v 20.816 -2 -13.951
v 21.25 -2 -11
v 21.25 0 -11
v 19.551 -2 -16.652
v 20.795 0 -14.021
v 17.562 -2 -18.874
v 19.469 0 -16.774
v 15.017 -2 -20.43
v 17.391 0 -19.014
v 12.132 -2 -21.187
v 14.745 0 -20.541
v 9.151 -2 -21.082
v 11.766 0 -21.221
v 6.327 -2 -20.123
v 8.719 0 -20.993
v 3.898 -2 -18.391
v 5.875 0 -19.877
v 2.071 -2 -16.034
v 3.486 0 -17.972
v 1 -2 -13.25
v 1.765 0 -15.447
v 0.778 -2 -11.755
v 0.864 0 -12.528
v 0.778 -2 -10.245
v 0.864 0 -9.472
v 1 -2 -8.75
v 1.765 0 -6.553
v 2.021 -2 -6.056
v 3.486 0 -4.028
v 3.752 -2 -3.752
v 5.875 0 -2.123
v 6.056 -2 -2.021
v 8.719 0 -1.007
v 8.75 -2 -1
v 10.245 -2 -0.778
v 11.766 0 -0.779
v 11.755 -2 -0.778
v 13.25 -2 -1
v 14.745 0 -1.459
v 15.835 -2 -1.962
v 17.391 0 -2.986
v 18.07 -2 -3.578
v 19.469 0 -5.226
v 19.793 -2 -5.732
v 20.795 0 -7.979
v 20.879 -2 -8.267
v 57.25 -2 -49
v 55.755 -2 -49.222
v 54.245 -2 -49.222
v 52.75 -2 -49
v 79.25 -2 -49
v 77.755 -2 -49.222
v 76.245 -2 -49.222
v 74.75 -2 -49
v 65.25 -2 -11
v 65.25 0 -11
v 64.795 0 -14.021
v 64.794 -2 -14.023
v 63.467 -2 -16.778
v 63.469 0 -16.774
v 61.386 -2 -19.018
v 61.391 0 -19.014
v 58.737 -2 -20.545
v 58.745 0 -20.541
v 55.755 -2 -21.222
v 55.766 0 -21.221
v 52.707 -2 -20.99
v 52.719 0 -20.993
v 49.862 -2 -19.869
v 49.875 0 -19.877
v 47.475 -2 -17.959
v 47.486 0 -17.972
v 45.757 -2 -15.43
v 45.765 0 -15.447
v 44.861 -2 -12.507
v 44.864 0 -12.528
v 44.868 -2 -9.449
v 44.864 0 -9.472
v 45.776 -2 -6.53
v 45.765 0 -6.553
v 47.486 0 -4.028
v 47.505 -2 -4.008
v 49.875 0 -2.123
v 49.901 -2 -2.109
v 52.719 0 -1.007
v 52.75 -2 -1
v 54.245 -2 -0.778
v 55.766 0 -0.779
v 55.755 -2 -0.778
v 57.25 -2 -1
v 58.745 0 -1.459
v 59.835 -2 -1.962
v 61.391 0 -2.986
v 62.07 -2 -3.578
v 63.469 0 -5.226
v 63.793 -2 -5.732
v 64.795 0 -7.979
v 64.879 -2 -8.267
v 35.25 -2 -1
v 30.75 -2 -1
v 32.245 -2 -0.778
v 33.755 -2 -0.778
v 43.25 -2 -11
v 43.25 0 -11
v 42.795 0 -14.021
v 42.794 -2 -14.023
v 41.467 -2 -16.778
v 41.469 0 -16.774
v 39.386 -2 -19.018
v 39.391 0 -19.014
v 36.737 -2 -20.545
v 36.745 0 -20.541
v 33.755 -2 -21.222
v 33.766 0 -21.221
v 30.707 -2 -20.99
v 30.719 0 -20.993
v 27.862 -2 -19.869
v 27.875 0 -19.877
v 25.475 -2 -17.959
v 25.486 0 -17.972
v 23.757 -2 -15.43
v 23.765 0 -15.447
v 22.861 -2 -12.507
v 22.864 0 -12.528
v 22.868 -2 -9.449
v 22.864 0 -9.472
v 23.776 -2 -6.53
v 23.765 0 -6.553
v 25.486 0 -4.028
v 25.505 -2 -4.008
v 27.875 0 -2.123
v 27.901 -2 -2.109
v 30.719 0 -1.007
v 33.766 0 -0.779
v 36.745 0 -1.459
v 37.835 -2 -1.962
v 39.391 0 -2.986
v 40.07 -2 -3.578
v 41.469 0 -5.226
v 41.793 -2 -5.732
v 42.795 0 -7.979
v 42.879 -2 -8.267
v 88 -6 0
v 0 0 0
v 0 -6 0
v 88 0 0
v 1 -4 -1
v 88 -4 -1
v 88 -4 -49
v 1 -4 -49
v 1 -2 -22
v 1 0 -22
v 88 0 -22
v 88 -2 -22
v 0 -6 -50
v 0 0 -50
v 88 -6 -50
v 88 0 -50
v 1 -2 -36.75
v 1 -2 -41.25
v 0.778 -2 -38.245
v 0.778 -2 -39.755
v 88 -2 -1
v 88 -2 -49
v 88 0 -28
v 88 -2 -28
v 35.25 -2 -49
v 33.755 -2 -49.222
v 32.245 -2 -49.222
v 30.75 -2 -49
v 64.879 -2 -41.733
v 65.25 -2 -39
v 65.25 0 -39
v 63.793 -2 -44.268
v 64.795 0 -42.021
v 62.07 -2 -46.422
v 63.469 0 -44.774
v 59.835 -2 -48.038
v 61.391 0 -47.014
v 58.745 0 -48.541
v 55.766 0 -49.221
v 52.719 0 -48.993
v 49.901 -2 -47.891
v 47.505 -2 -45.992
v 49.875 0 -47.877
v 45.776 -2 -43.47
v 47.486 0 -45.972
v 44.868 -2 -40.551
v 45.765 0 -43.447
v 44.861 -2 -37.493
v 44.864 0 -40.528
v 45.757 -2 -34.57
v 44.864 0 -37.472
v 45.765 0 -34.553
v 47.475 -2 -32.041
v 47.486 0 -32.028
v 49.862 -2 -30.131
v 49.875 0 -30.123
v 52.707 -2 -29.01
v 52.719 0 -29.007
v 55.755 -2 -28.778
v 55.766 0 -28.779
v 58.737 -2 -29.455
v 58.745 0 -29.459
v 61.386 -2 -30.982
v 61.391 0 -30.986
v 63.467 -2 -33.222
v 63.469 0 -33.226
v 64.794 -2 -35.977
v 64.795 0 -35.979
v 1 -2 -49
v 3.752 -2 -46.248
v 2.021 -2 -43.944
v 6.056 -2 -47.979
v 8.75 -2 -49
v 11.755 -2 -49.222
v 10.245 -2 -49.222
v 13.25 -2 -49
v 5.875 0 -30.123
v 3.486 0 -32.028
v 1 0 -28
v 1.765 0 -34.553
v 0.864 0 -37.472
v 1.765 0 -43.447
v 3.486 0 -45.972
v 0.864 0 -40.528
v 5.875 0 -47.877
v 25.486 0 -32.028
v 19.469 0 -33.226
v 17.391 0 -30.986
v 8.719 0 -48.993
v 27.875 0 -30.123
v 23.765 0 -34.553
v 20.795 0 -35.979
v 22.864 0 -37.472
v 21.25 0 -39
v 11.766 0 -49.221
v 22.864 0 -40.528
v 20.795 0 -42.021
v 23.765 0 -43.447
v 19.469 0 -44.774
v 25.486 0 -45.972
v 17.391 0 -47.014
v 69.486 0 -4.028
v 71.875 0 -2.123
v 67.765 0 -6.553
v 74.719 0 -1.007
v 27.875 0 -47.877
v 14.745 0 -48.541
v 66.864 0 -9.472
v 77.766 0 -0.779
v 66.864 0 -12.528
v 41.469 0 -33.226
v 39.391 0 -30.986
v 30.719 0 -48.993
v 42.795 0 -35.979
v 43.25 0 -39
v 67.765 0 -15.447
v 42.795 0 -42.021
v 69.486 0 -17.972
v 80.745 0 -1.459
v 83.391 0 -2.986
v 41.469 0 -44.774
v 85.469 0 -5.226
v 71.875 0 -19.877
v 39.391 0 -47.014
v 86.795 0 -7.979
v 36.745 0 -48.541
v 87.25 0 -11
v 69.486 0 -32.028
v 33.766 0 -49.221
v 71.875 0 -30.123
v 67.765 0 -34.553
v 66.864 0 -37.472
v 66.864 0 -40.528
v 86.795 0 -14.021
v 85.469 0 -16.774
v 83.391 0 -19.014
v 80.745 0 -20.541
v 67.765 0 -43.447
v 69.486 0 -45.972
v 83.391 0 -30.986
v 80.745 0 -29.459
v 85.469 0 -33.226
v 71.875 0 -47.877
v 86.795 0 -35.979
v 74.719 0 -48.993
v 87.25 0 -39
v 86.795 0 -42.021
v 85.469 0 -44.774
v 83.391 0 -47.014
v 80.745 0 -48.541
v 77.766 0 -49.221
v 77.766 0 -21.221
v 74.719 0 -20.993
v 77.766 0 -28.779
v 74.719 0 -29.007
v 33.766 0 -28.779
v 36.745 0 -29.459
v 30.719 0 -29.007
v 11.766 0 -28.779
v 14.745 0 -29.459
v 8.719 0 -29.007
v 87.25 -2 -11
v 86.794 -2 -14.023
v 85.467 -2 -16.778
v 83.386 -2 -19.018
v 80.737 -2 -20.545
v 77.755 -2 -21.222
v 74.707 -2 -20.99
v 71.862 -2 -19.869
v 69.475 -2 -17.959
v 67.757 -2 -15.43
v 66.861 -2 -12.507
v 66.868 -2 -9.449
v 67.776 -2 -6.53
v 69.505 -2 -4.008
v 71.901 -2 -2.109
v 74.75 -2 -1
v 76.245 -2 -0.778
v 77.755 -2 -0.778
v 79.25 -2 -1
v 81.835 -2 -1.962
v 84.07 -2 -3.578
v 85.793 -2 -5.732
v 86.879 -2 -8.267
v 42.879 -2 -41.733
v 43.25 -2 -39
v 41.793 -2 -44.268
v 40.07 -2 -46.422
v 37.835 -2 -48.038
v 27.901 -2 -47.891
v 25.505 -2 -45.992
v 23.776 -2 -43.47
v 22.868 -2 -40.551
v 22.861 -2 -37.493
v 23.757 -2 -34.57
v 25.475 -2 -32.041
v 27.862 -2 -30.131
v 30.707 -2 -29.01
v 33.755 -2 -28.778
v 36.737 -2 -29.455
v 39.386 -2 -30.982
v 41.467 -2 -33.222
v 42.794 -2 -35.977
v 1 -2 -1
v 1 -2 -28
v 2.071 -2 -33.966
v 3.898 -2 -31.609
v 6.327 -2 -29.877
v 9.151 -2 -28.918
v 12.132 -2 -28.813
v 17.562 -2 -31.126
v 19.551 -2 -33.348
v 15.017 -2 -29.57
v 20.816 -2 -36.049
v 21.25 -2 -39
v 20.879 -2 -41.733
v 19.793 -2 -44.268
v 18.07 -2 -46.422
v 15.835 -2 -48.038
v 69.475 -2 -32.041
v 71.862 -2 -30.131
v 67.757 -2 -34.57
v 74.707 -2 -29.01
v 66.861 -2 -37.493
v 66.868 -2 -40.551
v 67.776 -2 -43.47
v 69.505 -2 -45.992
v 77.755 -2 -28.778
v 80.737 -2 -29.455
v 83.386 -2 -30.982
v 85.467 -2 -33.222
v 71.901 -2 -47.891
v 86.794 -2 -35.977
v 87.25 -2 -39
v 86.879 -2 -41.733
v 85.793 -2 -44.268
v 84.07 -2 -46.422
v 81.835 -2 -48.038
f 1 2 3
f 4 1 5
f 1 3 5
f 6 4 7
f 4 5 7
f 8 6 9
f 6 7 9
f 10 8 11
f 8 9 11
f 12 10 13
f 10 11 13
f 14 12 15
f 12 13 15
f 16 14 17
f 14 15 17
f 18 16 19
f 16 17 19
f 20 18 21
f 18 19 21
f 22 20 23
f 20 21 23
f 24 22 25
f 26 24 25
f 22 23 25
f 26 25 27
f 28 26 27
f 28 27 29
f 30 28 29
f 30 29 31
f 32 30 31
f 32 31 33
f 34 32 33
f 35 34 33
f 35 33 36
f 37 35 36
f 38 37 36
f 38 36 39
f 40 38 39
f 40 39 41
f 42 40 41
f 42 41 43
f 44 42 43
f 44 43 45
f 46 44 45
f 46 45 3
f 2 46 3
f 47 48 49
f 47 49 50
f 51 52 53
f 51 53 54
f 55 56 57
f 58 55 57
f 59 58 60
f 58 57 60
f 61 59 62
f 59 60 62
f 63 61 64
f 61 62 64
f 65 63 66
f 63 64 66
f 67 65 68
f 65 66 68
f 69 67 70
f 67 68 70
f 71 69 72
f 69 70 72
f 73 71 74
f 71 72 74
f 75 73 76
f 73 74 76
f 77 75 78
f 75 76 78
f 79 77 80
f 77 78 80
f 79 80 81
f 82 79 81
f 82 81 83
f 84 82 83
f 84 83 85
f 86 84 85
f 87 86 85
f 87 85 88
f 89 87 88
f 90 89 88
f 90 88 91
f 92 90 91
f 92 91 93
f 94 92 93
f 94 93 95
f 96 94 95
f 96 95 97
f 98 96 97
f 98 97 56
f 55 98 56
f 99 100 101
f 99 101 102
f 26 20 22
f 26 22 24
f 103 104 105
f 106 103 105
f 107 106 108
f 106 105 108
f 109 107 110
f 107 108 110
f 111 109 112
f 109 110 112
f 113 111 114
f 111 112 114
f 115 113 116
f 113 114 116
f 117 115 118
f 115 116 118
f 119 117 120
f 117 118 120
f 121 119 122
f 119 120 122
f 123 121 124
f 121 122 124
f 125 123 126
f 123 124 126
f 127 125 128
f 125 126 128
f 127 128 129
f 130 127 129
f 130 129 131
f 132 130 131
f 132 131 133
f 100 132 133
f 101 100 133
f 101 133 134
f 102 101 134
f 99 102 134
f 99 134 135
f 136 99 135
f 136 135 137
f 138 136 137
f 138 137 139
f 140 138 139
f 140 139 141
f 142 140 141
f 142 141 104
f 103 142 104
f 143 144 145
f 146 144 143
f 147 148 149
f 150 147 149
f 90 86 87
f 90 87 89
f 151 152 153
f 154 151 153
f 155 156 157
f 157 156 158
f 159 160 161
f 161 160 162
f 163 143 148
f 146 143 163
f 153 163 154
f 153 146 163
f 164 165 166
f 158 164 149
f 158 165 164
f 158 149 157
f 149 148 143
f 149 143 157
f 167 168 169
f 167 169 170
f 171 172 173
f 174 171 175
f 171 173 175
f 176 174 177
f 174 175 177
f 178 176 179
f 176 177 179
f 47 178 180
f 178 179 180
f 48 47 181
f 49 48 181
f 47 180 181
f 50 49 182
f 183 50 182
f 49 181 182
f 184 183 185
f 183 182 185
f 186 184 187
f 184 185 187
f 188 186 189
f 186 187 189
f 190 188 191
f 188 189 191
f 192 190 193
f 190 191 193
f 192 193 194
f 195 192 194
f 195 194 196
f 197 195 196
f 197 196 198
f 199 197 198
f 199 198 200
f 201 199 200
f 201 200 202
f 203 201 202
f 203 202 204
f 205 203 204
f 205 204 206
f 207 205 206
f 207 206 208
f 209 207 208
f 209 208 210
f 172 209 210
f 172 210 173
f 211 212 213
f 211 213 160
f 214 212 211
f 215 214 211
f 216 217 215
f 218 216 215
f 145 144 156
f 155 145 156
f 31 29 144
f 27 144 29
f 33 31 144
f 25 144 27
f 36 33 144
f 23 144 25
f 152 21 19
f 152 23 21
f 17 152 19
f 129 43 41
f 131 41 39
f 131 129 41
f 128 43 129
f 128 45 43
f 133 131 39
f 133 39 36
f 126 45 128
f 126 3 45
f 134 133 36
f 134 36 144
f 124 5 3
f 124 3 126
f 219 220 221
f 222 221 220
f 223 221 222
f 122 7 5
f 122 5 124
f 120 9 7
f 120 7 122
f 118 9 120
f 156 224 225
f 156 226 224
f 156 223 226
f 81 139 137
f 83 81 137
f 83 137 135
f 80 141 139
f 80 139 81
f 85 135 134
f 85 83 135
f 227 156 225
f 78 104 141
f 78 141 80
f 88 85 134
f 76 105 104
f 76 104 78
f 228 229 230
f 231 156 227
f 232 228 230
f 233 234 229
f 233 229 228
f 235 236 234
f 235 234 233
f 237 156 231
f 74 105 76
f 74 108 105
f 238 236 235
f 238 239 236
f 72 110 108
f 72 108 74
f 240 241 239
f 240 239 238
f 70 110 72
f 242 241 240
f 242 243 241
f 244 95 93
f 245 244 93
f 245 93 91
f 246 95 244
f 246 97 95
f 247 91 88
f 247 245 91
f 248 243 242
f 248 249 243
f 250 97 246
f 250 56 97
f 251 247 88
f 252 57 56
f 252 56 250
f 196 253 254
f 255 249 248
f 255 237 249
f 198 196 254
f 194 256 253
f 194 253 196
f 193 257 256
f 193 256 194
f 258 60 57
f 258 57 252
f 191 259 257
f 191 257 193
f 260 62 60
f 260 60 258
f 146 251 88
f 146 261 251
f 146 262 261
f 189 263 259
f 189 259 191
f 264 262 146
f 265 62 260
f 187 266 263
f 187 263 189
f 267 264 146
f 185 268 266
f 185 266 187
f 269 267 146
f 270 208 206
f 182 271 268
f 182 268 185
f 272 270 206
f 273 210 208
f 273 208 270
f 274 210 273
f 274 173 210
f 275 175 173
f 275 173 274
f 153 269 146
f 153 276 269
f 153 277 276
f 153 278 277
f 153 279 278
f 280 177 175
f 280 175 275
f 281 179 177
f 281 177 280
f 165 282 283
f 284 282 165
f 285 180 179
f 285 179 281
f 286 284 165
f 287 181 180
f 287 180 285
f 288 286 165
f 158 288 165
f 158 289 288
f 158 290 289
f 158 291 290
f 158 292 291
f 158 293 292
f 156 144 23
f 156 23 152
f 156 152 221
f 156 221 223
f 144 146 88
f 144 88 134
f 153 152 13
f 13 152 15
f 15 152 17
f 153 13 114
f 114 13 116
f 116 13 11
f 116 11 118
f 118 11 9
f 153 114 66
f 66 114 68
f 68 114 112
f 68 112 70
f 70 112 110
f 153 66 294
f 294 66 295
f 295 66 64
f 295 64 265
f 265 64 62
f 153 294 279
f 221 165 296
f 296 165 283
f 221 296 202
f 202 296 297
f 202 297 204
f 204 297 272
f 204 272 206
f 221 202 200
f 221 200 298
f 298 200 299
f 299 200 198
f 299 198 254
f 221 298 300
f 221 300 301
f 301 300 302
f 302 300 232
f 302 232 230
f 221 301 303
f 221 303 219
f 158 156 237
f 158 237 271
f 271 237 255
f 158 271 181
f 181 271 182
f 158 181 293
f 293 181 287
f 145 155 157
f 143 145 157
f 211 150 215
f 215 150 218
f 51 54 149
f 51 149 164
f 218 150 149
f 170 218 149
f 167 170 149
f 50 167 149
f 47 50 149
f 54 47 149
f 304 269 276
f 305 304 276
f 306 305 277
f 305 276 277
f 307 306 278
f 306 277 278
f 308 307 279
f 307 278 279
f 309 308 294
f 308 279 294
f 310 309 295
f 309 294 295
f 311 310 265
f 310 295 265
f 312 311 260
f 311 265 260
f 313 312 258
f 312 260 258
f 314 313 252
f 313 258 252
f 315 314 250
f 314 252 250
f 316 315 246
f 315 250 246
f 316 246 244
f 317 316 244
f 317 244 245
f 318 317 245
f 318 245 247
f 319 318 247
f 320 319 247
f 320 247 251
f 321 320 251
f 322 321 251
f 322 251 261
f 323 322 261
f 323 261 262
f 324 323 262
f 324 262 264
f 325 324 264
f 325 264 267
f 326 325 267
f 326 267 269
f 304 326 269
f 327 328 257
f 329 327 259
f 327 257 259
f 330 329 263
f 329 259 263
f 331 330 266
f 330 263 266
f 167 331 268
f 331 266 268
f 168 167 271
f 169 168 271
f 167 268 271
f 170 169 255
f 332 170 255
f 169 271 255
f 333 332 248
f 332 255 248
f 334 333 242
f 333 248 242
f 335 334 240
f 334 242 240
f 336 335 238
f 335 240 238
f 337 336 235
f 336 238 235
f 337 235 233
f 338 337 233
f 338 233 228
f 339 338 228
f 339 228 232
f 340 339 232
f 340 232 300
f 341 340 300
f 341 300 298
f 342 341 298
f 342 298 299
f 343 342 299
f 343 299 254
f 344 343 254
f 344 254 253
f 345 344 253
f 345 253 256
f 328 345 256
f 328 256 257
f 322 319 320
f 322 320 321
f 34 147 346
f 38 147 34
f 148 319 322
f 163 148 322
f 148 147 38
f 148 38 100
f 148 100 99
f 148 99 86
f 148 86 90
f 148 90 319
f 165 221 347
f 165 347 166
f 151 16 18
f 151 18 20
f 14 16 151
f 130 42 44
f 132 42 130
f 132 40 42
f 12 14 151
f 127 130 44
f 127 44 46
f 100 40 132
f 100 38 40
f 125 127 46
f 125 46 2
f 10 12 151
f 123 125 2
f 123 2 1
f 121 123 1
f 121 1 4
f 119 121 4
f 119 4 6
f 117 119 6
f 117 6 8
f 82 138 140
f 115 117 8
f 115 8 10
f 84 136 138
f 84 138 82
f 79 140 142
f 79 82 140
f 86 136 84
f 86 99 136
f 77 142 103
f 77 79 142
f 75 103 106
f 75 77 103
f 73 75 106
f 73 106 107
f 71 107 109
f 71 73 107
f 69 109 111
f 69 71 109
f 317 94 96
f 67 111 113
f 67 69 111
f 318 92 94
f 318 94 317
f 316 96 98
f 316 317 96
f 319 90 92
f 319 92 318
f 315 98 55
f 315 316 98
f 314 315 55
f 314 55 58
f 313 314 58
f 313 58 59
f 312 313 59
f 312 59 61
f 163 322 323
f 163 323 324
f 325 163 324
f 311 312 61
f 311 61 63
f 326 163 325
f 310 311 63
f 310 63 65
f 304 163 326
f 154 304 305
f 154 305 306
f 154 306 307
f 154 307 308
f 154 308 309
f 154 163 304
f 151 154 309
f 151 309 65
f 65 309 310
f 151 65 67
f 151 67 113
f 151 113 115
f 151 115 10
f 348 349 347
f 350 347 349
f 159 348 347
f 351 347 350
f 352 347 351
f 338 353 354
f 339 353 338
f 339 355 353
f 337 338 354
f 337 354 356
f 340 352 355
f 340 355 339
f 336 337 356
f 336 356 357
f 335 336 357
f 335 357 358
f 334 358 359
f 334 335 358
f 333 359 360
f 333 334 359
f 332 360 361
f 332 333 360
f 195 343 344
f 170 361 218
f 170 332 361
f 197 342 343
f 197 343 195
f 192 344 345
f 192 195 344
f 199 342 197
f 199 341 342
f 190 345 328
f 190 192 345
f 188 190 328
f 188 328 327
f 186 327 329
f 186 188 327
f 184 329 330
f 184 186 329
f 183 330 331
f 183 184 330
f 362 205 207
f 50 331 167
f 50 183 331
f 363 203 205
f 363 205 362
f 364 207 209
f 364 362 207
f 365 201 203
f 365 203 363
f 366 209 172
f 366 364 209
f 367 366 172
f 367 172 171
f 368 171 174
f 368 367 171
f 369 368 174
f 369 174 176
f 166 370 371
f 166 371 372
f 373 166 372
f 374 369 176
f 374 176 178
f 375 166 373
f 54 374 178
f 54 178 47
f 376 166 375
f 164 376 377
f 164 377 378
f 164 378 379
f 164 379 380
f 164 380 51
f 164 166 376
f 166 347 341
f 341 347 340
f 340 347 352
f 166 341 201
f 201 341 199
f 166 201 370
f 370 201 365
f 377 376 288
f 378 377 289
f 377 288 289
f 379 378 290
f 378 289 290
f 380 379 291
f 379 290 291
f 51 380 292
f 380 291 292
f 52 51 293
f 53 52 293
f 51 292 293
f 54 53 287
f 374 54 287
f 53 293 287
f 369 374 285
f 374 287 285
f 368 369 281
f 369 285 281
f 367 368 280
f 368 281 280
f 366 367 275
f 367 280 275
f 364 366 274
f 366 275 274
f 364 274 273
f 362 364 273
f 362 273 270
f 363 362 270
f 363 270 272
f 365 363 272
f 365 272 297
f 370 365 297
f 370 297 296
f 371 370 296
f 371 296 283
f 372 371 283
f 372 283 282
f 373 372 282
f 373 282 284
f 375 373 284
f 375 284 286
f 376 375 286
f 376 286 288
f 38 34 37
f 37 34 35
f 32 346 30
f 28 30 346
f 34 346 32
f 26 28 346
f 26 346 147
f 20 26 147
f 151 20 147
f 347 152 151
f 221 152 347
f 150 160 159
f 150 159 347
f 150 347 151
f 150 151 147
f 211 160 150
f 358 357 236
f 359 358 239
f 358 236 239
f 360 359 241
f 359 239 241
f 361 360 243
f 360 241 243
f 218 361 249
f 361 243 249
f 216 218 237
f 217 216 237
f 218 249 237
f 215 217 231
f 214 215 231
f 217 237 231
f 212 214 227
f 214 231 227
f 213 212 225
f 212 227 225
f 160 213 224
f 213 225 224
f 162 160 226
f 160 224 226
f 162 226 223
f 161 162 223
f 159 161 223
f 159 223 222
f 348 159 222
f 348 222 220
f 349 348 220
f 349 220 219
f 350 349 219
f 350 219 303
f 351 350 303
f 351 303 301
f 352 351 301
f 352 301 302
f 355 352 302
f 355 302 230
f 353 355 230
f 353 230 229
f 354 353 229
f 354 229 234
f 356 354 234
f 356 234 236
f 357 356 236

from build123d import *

# Parameters (mm, degrees)
SKETCH1_W           = 88
SKETCH1_H           = 50
BOSS_EXTRUDE1_DEPTH = 6
SKETCH2_W           = 48
SKETCH2_H           = 2
CUT_EXTRUDE1_DEPTH  = 87
SKETCH3_R           = 10.25
CUT_EXTRUDE2_DEPTH  = 2
LPATTERN1_COUNT     = 4
LPATTERN1_PITCH     = 22
SKETCH4_R           = 10.25
CUT_EXTRUDE3_DEPTH  = 2
LPATTERN2_COUNT     = 4
LPATTERN2_PITCH     = 22
SKETCH5_W           = 87
SKETCH5_H           = 6
CUT_EXTRUDE4_DEPTH  = 2


with BuildPart() as part:
    # Sketch1 → Boss-Extrude1 (new body)
    with BuildSketch(Plane(origin=(0, 0, 0), x_dir=(1, 0, 0), z_dir=(0, 1, 0))):
        with Locations((44, 25)):
            Rectangle(SKETCH1_W, SKETCH1_H)
    extrude(amount=-BOSS_EXTRUDE1_DEPTH)

    # Sketch2 → Cut-Extrude1 (cut)
    with BuildSketch(Plane(origin=(88, 0, 0), x_dir=(0, 0, -1), z_dir=(1, 0, 0))):
        with Locations((25, -3)):
            Rectangle(SKETCH2_W, SKETCH2_H)
    extrude(amount=-CUT_EXTRUDE1_DEPTH, mode=Mode.SUBTRACT)

    # Sketch3 → Cut-Extrude2 (cut)
    with BuildSketch(Plane(origin=(0, 0, 0), x_dir=(1, 0, 0), z_dir=(0, 1, 0))):
        with Locations((77, 11)):
            Circle(SKETCH3_R)
    cut_extrude2 = extrude(amount=-CUT_EXTRUDE2_DEPTH, mode=Mode.SUBTRACT)

    # LPattern1: Cut-Extrude2 ×4
    with Locations(*[(-i * LPATTERN1_PITCH, 0, 0) for i in range(1, LPATTERN1_COUNT)]):
        add(cut_extrude2, mode=Mode.SUBTRACT)

    # Sketch4 → Cut-Extrude3 (cut)
    with BuildSketch(Plane(origin=(0, 0, 0), x_dir=(1, 0, 0), z_dir=(0, 1, 0))):
        with Locations((77, 39)):
            Circle(SKETCH4_R)
    cut_extrude3 = extrude(amount=-CUT_EXTRUDE3_DEPTH, mode=Mode.SUBTRACT)

    # LPattern2: Cut-Extrude3 ×4
    with Locations(*[(-i * LPATTERN2_PITCH, 0, 0) for i in range(1, LPATTERN2_COUNT)]):
        add(cut_extrude3, mode=Mode.SUBTRACT)

    # Sketch5 → Cut-Extrude4 (cut)
    with BuildSketch(Plane(origin=(0, 0, 0), x_dir=(1, 0, 0), z_dir=(0, 1, 0))):
        with Locations((44.5, 25)):
            Rectangle(SKETCH5_W, SKETCH5_H)
    extrude(amount=-CUT_EXTRUDE4_DEPTH, mode=Mode.SUBTRACT)


solid = part.part
